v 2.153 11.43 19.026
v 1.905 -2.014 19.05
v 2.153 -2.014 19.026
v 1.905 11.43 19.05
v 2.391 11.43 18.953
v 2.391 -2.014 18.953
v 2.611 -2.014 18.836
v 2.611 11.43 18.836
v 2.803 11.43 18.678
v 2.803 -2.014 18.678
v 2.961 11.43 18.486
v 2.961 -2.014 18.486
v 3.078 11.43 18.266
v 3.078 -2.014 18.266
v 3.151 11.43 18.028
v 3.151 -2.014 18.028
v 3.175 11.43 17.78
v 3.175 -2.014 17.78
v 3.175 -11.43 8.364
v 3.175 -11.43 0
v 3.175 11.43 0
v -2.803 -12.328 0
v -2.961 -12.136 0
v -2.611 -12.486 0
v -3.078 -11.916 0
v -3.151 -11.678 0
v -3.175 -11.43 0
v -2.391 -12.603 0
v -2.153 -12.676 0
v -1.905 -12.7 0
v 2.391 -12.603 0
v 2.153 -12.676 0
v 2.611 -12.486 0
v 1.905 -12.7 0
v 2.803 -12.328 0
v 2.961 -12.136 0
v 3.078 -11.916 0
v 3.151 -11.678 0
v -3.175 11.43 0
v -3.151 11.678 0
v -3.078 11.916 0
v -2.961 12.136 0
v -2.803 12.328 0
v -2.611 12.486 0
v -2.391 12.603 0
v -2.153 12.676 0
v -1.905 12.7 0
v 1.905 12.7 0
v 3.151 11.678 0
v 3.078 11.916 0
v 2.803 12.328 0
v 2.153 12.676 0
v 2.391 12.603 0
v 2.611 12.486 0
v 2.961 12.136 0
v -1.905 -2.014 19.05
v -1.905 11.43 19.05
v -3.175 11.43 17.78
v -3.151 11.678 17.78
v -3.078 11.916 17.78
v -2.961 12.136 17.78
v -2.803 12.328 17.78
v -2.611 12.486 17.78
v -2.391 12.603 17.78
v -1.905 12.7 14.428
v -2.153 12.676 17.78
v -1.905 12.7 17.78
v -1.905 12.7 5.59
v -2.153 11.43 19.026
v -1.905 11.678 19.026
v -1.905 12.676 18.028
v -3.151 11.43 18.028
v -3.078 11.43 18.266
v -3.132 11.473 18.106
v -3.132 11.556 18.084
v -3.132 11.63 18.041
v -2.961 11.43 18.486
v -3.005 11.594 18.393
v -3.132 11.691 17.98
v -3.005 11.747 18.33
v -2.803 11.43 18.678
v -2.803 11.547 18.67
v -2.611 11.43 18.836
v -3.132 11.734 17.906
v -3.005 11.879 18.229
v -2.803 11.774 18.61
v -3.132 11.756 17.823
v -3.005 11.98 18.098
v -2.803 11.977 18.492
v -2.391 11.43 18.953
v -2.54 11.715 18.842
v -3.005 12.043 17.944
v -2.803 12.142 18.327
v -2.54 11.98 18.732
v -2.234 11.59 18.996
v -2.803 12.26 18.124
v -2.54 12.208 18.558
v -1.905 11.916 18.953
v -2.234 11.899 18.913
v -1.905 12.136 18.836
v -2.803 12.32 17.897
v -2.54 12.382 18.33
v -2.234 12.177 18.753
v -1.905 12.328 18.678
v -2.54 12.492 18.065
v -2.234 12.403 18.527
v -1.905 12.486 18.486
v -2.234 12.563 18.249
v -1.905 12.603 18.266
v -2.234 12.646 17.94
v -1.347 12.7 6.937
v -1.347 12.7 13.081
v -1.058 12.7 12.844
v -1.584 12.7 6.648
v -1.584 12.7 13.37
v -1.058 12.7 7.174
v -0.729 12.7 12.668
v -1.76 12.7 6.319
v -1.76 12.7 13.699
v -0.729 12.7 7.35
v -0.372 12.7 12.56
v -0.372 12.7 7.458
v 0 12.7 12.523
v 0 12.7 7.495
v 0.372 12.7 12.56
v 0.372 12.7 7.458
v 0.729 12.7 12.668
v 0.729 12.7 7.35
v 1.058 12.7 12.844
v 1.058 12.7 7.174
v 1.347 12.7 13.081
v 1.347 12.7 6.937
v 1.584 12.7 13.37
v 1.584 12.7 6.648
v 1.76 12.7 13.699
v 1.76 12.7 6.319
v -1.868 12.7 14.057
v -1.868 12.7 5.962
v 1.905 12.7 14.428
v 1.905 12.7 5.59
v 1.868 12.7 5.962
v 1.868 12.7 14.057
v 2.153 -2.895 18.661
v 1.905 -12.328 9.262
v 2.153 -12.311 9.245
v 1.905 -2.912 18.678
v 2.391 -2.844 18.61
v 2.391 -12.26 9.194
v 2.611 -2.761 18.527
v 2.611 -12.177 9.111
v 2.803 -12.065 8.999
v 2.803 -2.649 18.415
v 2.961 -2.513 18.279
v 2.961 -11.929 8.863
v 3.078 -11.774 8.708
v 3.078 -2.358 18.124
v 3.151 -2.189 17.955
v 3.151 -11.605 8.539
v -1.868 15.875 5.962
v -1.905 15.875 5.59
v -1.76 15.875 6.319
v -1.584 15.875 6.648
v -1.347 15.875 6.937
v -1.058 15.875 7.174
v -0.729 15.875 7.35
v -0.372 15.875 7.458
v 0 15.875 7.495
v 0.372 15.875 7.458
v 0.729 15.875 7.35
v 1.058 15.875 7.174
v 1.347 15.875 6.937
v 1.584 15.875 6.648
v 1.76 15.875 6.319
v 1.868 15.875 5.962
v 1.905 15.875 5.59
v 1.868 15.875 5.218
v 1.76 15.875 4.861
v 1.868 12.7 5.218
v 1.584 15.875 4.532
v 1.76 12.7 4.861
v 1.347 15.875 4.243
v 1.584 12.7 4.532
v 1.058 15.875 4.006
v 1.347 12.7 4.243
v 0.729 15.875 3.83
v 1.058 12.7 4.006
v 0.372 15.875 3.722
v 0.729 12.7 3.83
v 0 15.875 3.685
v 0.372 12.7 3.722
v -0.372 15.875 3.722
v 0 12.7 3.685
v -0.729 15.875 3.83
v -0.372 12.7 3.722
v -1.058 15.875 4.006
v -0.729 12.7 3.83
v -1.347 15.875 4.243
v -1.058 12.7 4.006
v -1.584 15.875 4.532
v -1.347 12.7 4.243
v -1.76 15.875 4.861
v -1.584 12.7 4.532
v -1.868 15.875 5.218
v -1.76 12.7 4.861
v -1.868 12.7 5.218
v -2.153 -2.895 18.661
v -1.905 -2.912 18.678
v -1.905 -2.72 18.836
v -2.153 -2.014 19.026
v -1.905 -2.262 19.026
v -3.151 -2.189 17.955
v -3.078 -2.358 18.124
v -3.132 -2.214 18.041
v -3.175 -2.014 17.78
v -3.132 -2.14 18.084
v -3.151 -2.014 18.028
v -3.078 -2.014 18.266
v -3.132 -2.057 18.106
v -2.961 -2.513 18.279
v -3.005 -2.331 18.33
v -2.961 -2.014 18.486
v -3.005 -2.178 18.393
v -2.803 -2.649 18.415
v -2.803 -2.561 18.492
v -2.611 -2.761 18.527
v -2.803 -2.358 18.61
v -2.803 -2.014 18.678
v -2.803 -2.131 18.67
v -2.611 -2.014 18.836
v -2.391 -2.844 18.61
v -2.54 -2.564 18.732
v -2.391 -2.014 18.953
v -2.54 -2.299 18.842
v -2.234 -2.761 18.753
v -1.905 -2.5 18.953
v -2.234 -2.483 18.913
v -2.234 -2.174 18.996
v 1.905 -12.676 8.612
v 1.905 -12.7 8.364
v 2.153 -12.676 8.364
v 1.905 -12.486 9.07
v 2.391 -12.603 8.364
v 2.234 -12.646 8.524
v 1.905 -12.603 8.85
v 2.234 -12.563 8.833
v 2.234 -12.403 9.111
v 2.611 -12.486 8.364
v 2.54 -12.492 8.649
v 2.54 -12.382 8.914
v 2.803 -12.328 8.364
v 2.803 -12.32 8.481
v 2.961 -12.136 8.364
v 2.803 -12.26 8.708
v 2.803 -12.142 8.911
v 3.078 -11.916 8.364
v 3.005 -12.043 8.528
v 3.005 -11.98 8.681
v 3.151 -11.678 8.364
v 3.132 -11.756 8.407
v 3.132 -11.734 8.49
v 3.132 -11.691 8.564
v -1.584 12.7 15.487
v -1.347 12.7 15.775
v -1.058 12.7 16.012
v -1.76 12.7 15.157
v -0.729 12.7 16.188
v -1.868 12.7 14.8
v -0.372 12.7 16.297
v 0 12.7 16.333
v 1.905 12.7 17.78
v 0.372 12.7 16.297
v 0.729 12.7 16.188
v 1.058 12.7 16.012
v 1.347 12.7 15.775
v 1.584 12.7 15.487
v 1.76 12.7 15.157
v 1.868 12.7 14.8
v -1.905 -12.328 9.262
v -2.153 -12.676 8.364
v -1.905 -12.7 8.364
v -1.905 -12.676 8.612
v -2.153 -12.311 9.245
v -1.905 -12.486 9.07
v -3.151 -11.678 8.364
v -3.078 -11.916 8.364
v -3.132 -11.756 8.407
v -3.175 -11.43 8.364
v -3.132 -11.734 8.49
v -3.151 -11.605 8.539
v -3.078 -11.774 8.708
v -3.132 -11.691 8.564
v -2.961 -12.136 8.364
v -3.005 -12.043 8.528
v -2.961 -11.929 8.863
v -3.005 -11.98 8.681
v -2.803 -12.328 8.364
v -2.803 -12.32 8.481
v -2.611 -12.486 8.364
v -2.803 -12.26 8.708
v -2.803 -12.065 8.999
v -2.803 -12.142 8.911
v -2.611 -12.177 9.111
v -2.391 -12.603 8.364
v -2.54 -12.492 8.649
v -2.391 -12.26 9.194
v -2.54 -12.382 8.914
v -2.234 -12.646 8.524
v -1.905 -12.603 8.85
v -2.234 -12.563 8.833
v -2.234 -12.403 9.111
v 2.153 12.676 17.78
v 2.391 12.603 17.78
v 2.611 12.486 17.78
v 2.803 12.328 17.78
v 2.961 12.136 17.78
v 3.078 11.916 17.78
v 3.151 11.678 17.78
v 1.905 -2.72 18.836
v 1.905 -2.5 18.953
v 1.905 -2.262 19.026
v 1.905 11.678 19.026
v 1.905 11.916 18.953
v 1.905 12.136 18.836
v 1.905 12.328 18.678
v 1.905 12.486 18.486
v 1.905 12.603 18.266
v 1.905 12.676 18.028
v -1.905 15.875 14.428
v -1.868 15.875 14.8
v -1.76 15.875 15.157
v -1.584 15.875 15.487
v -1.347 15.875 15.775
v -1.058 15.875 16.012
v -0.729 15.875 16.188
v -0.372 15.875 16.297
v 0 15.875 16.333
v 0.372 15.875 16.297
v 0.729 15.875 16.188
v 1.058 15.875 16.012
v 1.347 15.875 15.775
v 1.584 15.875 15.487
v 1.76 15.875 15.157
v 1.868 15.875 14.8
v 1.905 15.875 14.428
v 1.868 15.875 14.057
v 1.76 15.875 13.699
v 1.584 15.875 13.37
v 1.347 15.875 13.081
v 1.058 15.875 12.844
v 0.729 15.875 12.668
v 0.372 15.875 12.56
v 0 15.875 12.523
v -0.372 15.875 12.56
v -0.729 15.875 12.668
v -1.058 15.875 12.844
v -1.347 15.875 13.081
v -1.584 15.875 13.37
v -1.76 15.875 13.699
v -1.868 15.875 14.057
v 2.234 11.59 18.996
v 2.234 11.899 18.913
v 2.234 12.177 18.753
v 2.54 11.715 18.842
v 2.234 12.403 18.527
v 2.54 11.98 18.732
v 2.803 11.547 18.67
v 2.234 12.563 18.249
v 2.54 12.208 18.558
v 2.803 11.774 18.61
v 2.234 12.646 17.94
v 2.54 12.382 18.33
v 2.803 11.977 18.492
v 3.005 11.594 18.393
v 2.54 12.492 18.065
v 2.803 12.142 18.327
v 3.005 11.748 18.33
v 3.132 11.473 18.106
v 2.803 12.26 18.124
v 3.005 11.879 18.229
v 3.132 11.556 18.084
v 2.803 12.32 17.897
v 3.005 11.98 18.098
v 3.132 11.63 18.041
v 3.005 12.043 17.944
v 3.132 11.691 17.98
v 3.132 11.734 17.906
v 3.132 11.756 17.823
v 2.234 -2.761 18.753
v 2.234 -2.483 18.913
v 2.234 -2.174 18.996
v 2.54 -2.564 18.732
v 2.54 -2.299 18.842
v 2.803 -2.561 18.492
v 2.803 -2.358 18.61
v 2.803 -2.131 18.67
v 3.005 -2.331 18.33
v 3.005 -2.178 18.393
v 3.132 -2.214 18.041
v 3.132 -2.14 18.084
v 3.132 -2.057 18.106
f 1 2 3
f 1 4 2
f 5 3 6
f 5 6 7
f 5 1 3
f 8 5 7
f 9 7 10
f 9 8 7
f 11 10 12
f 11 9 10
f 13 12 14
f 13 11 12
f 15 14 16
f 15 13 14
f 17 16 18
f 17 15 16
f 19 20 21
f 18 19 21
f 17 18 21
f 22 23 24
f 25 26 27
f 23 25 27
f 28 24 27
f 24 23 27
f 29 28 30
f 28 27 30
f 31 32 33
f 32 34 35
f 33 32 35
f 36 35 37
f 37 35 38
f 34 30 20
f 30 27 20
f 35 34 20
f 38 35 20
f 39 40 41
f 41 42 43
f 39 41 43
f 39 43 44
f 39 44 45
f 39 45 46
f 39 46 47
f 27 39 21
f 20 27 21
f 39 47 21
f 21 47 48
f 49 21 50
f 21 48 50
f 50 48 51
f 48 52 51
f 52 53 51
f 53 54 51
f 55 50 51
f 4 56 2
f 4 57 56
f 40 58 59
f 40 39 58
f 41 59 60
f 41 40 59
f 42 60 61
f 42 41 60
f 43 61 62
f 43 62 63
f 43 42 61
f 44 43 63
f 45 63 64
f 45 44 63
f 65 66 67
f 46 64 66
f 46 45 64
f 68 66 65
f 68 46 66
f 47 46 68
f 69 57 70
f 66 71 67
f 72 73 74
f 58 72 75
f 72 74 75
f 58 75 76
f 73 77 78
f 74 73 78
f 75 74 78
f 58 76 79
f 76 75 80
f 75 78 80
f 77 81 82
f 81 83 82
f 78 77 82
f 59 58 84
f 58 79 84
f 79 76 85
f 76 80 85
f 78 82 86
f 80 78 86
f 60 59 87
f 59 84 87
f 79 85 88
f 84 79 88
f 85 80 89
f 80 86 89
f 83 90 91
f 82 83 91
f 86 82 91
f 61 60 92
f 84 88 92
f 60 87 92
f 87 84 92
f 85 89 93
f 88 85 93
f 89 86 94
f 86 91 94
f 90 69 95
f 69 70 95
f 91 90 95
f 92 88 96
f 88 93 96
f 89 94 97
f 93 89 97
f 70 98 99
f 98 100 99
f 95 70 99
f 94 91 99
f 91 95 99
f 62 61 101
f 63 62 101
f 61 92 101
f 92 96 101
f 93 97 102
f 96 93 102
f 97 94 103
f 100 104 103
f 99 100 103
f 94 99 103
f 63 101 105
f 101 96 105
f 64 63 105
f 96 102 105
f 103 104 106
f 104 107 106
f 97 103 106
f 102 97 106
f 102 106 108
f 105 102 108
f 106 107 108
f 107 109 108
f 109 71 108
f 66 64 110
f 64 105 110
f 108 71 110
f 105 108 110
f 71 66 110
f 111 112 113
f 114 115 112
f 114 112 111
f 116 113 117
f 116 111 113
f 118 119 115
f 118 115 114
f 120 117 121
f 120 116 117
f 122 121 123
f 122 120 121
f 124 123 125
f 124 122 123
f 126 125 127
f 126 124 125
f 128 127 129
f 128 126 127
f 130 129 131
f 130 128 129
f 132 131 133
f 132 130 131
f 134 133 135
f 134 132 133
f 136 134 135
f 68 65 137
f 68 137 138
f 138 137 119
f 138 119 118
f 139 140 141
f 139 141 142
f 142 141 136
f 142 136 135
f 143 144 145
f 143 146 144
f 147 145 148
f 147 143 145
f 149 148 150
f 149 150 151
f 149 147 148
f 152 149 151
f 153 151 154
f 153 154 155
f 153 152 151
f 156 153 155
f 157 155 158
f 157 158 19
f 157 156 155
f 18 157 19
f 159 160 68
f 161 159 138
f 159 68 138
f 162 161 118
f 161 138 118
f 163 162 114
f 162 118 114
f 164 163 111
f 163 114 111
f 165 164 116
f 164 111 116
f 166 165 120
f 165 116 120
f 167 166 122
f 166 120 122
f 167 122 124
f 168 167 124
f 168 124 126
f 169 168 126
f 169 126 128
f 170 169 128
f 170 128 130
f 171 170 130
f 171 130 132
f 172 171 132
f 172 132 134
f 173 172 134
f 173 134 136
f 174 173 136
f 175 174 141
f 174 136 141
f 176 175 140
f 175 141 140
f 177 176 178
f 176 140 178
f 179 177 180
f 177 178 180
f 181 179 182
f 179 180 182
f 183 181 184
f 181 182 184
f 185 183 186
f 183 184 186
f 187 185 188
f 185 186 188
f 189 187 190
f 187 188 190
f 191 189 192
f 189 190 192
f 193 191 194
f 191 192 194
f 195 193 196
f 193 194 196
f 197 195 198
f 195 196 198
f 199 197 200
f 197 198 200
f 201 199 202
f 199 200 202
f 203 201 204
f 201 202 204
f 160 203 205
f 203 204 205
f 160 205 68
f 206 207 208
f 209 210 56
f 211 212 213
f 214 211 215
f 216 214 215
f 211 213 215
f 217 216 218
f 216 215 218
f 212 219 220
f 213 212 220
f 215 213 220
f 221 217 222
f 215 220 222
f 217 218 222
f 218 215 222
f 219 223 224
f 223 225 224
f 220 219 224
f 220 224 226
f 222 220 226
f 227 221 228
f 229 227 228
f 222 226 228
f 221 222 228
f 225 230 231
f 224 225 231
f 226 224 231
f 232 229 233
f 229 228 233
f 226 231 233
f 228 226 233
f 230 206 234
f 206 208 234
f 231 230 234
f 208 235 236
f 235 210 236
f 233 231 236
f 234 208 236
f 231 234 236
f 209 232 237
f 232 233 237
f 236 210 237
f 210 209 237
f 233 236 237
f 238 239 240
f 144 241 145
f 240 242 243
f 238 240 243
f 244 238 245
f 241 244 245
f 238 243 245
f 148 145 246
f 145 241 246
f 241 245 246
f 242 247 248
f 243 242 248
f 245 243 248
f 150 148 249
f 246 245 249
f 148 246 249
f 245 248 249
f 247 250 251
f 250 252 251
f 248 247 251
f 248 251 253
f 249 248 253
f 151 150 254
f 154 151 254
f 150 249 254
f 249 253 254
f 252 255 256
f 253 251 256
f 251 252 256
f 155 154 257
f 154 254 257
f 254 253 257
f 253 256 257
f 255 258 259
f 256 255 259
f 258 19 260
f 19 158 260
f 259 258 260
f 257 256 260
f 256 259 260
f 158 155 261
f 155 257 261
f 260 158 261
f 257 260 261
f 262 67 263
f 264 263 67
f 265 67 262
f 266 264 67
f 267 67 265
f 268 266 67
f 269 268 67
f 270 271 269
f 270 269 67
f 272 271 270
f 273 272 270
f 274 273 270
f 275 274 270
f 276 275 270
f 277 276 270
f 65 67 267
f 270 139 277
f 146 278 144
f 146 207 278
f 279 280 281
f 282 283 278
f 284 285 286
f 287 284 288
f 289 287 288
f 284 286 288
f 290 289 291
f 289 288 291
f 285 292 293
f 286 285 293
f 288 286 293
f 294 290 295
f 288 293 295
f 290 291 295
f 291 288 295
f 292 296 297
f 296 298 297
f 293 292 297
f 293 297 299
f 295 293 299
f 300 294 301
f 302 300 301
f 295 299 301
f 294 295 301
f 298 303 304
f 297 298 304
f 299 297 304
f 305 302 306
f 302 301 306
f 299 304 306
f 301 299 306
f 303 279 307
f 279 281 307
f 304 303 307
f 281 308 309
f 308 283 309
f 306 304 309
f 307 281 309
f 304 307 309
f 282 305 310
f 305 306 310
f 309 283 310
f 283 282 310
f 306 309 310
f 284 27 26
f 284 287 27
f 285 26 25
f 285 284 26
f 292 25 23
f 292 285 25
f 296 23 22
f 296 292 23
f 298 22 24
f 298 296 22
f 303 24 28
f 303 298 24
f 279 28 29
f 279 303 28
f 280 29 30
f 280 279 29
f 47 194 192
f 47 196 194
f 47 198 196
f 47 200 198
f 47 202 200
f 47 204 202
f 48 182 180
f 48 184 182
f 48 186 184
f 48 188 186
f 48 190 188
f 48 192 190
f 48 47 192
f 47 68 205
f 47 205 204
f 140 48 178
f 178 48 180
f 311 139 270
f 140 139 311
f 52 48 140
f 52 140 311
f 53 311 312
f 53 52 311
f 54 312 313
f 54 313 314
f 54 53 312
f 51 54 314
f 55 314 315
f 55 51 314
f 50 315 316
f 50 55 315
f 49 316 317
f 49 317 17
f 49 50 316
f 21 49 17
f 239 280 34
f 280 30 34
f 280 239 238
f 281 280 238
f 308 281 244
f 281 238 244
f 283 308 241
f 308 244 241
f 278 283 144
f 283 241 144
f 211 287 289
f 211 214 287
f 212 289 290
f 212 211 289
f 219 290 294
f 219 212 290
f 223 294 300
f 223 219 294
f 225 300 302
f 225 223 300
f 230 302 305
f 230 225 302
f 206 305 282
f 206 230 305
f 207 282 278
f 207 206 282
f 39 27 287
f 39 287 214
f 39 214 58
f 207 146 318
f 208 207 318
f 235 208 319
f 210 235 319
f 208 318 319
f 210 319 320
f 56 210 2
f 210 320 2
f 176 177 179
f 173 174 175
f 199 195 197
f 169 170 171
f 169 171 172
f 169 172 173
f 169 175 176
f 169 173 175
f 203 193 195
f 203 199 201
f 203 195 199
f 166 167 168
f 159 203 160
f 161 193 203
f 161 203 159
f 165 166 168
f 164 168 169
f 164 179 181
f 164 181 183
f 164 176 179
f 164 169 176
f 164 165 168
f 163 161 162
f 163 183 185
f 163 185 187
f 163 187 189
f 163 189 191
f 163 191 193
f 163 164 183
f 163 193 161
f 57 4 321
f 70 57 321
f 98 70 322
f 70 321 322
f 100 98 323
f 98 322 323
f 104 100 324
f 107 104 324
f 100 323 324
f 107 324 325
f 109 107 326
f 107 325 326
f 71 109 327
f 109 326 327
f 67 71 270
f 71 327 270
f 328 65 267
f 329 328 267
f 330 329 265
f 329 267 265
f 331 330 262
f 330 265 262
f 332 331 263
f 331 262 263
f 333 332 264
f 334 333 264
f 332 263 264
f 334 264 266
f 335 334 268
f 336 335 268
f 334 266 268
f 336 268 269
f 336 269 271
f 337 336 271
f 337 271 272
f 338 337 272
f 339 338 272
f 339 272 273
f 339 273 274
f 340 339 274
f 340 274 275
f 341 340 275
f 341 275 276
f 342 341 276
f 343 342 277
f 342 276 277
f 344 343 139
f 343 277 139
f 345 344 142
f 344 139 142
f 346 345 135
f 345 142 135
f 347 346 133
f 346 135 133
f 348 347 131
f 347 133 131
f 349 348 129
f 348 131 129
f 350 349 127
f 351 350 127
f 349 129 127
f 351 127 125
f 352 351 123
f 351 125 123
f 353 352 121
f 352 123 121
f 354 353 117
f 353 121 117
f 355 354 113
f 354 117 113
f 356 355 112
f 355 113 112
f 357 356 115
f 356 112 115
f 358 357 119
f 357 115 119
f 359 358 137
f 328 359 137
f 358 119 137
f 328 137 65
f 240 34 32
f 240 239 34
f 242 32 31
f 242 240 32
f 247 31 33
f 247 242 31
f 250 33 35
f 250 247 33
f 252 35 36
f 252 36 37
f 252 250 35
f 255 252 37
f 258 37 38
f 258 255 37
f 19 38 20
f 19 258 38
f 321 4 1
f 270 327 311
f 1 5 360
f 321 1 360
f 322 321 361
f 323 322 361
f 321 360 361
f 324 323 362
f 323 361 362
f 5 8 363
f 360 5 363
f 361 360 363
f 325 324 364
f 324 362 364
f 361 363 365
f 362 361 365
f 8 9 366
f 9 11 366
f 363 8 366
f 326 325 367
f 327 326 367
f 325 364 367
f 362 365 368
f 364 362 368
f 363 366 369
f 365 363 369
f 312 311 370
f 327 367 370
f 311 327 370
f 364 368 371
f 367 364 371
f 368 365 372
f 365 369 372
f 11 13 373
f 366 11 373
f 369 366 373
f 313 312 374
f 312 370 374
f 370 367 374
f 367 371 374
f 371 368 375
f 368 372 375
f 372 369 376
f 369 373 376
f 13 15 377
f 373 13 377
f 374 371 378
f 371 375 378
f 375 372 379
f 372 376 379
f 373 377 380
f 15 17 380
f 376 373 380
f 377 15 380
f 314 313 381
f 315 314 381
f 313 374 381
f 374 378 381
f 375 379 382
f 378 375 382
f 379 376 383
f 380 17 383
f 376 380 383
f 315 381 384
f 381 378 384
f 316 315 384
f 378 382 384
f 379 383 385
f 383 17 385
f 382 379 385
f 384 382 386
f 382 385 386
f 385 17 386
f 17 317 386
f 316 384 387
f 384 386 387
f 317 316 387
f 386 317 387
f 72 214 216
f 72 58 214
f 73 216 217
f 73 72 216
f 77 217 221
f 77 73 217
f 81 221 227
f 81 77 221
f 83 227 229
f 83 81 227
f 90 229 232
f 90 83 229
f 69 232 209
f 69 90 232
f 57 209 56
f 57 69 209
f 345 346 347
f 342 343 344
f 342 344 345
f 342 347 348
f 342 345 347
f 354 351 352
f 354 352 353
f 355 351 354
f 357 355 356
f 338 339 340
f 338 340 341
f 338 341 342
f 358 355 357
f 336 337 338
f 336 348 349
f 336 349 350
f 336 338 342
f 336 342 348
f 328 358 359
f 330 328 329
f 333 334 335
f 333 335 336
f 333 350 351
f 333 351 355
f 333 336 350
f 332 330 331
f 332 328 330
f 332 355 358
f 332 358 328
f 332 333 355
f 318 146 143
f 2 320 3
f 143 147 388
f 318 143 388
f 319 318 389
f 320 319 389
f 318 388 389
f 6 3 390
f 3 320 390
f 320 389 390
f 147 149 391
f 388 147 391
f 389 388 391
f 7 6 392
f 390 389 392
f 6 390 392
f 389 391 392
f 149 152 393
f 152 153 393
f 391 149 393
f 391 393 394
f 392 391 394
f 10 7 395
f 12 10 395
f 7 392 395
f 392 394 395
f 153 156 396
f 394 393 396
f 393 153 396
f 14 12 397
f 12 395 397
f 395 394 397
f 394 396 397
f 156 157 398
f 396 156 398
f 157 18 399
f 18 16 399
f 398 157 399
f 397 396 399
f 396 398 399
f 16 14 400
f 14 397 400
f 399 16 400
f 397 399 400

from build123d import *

# Parameters (mm, degrees)
F0_W     = 6.35
F0_H     = 25.4
F1_DEPTH = 19.05
F2_SIZE  = 10.16
F3_R     = 1.27
F4_R     = 1.27
F5_R     = 1.905
F6_DEPTH = 3.175


with BuildPart() as f1:
    # F0 (on Top) → F1 (new body)
    with BuildSketch(Plane.XY):
        Rectangle(F0_W, F0_H)
    extrude(amount=F1_DEPTH)

    # F2
    f2_edges = [f1.edges().sort_by_distance(p)[0] for p in [
        (0, -12.7, 19.05),
    ]]
    chamfer(f2_edges, length=F2_SIZE)

    # F3
    f3_edges = [f1.edges().sort_by_distance(p)[0] for p in [
        (0, 12.7, 19.05),
        (0, -2.54, 19.05),
        (0, -12.7, 8.89),
    ]]
    fillet(f3_edges, radius=F3_R)

    # F4
    f4_edges = [f1.edges().sort_by_distance(p)[0] for p in [
        (3.175, -12.7, 4.181974),
        (3.175, -7.62, 13.97),
        (-3.175, -12.7, 4.181974),
        (-3.175, -7.62, 13.97),
        (-3.175, -12.603327, 8.849957),
        (3.175, -12.603327, 8.849957),
        (3.175, -2.499957, 18.953327),
        (3.175, 4.708026, 19.05),
        (-3.175, -2.499957, 18.953327),
        (-3.175, 4.708026, 19.05),
        (-3.175, 12.328026, 18.678026),
        (3.175, 12.328026, 18.678026),
        (3.175, 12.7, 8.89),
        (-3.175, 12.7, 8.89),
    ]]
    fillet(f4_edges, radius=F4_R)

    # F5 (on face) → F6 (join)
    with BuildSketch(Plane(origin=(0, 12.7, 0), x_dir=(-1, 0, 0), z_dir=(0, 1, 0))):
        with Locations((0, 14.4283687696)):
            Circle(F5_R)
        with Locations((0, 5.5899028666)):
            Circle(F5_R)
    extrude(amount=F6_DEPTH)


solid = f1.part
